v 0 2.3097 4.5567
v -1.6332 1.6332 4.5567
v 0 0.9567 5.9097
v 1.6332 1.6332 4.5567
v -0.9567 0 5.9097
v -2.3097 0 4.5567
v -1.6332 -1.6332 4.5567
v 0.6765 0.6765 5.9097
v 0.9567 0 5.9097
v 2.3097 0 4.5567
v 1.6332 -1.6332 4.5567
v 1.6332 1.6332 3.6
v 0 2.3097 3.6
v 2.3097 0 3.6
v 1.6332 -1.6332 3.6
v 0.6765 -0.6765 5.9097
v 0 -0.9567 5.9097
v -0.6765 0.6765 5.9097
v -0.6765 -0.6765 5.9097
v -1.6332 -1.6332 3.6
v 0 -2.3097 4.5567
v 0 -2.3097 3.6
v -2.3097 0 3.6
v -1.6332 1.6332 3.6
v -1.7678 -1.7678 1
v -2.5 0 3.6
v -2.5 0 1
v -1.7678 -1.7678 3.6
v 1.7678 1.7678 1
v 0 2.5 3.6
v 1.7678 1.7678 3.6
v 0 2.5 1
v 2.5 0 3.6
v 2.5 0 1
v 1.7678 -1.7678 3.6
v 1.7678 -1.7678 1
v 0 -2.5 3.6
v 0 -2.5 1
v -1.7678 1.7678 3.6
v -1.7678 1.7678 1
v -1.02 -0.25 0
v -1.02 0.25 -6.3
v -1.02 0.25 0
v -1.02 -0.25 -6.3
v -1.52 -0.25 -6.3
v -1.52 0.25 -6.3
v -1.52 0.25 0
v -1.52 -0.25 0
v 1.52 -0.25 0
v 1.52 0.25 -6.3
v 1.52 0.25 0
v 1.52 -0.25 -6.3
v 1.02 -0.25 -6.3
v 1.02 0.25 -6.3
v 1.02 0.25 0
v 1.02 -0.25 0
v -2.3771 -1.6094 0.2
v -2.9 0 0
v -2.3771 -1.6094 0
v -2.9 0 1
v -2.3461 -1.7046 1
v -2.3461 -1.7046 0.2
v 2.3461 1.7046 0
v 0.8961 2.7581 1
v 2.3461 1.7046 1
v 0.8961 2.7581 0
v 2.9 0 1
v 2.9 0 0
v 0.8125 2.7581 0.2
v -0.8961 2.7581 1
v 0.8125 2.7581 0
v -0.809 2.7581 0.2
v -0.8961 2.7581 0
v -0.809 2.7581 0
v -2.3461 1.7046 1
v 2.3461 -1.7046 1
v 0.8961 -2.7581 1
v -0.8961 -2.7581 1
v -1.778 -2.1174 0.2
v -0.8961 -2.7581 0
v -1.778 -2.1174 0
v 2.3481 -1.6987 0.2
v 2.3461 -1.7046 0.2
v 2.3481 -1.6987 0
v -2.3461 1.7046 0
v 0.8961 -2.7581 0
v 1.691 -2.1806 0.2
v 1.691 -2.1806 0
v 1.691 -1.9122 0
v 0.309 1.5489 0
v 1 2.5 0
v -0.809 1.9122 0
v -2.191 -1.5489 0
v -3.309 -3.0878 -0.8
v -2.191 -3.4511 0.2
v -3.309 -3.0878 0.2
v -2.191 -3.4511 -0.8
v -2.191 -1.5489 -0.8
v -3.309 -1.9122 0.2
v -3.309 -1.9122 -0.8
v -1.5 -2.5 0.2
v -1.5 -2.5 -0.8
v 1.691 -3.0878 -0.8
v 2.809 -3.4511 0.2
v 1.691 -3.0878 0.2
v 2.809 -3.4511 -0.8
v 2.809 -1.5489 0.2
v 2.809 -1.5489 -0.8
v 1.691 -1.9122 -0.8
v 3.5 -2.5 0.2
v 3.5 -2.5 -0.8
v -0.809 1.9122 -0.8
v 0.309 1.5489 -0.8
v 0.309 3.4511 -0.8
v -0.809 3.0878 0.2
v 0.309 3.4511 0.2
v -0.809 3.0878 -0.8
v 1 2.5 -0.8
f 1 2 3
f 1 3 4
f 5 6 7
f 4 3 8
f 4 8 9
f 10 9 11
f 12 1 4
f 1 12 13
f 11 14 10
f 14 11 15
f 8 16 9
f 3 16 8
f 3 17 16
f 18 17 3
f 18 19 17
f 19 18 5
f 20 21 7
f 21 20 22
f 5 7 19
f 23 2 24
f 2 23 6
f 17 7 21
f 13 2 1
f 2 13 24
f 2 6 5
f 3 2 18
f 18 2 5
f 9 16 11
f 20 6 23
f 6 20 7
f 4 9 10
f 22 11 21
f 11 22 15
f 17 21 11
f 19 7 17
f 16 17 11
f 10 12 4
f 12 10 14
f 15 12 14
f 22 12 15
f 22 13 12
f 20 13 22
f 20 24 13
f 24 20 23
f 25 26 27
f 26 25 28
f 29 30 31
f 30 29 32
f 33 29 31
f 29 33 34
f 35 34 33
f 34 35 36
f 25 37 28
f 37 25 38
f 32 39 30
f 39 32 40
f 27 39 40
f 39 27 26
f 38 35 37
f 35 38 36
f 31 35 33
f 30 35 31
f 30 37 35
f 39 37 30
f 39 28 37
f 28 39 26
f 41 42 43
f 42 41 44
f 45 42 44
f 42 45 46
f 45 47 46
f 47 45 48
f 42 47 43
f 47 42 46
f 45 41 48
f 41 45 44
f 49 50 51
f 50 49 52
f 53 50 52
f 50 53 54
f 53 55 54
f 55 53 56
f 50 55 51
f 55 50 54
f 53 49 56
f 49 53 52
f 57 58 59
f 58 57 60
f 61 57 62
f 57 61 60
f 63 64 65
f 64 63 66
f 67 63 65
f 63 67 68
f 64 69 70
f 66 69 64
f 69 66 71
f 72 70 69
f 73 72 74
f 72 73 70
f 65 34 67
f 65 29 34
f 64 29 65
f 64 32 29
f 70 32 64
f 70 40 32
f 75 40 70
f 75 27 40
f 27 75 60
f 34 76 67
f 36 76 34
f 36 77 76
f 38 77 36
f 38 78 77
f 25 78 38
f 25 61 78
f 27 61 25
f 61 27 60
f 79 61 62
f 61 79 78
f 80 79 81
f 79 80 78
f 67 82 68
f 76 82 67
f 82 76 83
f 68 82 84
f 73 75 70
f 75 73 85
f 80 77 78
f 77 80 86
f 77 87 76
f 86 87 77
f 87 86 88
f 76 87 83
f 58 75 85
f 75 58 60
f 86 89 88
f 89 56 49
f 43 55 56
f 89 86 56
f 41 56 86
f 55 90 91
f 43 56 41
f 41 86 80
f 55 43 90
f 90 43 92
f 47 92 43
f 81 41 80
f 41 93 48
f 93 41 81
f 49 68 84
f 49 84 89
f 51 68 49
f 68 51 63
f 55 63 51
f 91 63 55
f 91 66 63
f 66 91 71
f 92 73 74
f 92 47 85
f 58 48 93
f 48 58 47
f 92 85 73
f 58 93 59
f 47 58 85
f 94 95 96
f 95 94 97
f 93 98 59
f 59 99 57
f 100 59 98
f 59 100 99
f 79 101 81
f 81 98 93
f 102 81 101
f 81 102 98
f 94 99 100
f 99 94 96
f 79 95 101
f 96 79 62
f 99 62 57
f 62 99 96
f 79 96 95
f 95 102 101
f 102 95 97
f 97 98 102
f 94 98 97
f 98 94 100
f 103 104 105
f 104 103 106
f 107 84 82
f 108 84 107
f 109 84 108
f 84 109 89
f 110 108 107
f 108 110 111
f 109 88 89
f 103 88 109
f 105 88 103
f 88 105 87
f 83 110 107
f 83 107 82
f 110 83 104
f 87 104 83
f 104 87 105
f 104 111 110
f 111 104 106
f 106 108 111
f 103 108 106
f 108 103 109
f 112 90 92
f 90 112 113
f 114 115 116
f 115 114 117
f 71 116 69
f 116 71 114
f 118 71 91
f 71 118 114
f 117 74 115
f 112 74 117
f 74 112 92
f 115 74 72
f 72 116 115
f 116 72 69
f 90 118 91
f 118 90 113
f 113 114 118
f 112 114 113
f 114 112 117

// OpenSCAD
// Parameters
led_diameter_mm = 5; //[2.5:10:0.1]
body_height_mm = 5.9; //[3:12:0.1]
dome_height_mm = 2.5; //[1.25:5:0.1]
rim_thickness_mm = 1; //[0.5:2:0.1]
rim_diameter_mm = 5.8; //[4:11.6:0.1]
lead_pitch_mm = 2.54; //[1.27:5.08:0.01]
lead_length_mm = 5; //[2.5:10:0.1]
lead_thickness_mm = 0.5; //[0.25:1:0.05]
overlap_mm = 0.8; //[0.2:2:0.1]
grill_hole_mm = 2; //[1:4:0.1]
grill_width_mm = 10; //[5:20:0.5]
grill_height_mm = 10; //[5:20:0.5]

// LED - complete geometry
module led() {
  color("red") {
    // LED Body
    union() {
      // Cylindrical body
      translate([0, 0, rim_thickness_mm + (body_height_mm - dome_height_mm)/2 - overlap_mm])
        cylinder(r=led_diameter_mm/2, h=body_height_mm - dome_height_mm, center=true);
      
      // Dome
      translate([0, 0, rim_thickness_mm + (body_height_mm - dome_height_mm) - overlap_mm])
        difference() {
          sphere(r=led_diameter_mm/2, center=true);
          translate([0, 0, -led_diameter_mm])
            cube([led_diameter_mm*2, led_diameter_mm*2, led_diameter_mm*2], center=true);
        }
    }
    
    // Rim Flange
    translate([0, 0, rim_thickness_mm/2])
      cylinder(r=rim_diameter_mm/2, h=rim_thickness_mm, center=true);
    
    // Leads
    union() {
      translate([-lead_pitch_mm/2, 0, (rim_thickness_mm - (lead_length_mm + rim_thickness_mm + overlap_mm))/2])
        cube([lead_thickness_mm, lead_thickness_mm, lead_length_mm + rim_thickness_mm + overlap_mm], center=true);
      translate([lead_pitch_mm/2, 0, (rim_thickness_mm - (lead_length_mm + rim_thickness_mm + overlap_mm))/2])
        cube([lead_thickness_mm, lead_thickness_mm, lead_length_mm + rim_thickness_mm + overlap_mm], center=true);
    }
  }
}

// Grill Hole Positions - complete geometry
module grill_hole_positions() {
  color("Silver") {
    union() {
      translate([-grill_width_mm/4, -grill_height_mm/4, rim_thickness_mm/2 - overlap_mm])
        cylinder(r=grill_hole_mm/2, h=rim_thickness_mm, center=true);
      translate([grill_width_mm/4, -grill_height_mm/4, rim_thickness_mm/2 - overlap_mm])
        cylinder(r=grill_hole_mm/2, h=rim_thickness_mm, center=true);
      translate([0, grill_height_mm/4, rim_thickness_mm/2 - overlap_mm])
        cylinder(r=grill_hole_mm/2, h=rim_thickness_mm, center=true);
    }
  }
}

// Assembly
module assembly() {
  led();
  grill_hole_positions();
}

assembly();
